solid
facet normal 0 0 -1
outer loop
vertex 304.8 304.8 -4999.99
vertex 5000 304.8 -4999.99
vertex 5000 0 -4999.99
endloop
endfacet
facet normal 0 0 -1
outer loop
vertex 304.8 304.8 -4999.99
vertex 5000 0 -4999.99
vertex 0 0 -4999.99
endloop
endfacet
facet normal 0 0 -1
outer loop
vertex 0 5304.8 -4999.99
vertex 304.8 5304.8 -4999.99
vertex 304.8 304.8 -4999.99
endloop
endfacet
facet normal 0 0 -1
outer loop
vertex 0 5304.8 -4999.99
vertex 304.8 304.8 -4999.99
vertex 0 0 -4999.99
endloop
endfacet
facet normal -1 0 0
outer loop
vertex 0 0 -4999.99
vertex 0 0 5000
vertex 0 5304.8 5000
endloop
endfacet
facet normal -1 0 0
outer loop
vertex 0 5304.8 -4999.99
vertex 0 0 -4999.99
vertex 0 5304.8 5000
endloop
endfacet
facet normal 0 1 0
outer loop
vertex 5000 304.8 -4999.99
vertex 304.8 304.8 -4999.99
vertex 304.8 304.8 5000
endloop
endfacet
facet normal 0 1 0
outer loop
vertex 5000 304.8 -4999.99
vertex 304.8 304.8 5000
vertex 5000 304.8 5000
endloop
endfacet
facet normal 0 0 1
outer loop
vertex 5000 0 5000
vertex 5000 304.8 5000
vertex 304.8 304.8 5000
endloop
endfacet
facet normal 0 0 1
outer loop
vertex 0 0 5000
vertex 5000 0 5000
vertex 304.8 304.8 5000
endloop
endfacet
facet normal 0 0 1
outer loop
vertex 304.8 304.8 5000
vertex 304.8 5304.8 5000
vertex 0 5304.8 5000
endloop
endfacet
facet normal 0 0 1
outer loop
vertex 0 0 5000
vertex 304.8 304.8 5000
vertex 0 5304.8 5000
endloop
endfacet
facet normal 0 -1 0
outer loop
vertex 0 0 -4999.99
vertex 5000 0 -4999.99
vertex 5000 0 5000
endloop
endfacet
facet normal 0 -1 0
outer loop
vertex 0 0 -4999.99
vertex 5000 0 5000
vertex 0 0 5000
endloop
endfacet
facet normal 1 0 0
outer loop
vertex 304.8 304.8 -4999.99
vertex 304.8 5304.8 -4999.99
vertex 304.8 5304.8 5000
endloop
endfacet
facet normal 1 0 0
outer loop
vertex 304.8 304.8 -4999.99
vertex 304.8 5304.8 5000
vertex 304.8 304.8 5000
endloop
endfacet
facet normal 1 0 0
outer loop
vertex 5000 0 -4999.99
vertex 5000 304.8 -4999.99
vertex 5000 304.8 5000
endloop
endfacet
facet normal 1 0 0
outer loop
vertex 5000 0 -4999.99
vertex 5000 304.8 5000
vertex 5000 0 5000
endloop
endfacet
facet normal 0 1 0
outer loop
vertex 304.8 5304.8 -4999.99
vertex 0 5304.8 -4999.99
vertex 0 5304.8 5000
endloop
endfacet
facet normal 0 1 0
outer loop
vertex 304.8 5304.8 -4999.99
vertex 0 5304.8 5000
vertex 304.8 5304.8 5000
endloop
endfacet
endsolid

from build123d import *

# Parameters (mm, degrees)
BOSS_EXTRUDE1_DEPTH      = 4999.99999998
BOSS_EXTRUDE1_DEPTH_BACK = 4999.99


with BuildPart() as part:
    # wall → Boss-Extrude1 (new body, two sides)
    with BuildSketch(Plane.XY) as boss_extrude1_sk:
        Polygon((0, 0), (0, 5304.79999998), (304.8, 5304.79999998), (304.8, 304.8), (4999.99999998, 304.8), (4999.99999998, 0), align=None)
    extrude(amount=BOSS_EXTRUDE1_DEPTH)
    extrude(boss_extrude1_sk.sketch, amount=-BOSS_EXTRUDE1_DEPTH_BACK)


solid = part.part
